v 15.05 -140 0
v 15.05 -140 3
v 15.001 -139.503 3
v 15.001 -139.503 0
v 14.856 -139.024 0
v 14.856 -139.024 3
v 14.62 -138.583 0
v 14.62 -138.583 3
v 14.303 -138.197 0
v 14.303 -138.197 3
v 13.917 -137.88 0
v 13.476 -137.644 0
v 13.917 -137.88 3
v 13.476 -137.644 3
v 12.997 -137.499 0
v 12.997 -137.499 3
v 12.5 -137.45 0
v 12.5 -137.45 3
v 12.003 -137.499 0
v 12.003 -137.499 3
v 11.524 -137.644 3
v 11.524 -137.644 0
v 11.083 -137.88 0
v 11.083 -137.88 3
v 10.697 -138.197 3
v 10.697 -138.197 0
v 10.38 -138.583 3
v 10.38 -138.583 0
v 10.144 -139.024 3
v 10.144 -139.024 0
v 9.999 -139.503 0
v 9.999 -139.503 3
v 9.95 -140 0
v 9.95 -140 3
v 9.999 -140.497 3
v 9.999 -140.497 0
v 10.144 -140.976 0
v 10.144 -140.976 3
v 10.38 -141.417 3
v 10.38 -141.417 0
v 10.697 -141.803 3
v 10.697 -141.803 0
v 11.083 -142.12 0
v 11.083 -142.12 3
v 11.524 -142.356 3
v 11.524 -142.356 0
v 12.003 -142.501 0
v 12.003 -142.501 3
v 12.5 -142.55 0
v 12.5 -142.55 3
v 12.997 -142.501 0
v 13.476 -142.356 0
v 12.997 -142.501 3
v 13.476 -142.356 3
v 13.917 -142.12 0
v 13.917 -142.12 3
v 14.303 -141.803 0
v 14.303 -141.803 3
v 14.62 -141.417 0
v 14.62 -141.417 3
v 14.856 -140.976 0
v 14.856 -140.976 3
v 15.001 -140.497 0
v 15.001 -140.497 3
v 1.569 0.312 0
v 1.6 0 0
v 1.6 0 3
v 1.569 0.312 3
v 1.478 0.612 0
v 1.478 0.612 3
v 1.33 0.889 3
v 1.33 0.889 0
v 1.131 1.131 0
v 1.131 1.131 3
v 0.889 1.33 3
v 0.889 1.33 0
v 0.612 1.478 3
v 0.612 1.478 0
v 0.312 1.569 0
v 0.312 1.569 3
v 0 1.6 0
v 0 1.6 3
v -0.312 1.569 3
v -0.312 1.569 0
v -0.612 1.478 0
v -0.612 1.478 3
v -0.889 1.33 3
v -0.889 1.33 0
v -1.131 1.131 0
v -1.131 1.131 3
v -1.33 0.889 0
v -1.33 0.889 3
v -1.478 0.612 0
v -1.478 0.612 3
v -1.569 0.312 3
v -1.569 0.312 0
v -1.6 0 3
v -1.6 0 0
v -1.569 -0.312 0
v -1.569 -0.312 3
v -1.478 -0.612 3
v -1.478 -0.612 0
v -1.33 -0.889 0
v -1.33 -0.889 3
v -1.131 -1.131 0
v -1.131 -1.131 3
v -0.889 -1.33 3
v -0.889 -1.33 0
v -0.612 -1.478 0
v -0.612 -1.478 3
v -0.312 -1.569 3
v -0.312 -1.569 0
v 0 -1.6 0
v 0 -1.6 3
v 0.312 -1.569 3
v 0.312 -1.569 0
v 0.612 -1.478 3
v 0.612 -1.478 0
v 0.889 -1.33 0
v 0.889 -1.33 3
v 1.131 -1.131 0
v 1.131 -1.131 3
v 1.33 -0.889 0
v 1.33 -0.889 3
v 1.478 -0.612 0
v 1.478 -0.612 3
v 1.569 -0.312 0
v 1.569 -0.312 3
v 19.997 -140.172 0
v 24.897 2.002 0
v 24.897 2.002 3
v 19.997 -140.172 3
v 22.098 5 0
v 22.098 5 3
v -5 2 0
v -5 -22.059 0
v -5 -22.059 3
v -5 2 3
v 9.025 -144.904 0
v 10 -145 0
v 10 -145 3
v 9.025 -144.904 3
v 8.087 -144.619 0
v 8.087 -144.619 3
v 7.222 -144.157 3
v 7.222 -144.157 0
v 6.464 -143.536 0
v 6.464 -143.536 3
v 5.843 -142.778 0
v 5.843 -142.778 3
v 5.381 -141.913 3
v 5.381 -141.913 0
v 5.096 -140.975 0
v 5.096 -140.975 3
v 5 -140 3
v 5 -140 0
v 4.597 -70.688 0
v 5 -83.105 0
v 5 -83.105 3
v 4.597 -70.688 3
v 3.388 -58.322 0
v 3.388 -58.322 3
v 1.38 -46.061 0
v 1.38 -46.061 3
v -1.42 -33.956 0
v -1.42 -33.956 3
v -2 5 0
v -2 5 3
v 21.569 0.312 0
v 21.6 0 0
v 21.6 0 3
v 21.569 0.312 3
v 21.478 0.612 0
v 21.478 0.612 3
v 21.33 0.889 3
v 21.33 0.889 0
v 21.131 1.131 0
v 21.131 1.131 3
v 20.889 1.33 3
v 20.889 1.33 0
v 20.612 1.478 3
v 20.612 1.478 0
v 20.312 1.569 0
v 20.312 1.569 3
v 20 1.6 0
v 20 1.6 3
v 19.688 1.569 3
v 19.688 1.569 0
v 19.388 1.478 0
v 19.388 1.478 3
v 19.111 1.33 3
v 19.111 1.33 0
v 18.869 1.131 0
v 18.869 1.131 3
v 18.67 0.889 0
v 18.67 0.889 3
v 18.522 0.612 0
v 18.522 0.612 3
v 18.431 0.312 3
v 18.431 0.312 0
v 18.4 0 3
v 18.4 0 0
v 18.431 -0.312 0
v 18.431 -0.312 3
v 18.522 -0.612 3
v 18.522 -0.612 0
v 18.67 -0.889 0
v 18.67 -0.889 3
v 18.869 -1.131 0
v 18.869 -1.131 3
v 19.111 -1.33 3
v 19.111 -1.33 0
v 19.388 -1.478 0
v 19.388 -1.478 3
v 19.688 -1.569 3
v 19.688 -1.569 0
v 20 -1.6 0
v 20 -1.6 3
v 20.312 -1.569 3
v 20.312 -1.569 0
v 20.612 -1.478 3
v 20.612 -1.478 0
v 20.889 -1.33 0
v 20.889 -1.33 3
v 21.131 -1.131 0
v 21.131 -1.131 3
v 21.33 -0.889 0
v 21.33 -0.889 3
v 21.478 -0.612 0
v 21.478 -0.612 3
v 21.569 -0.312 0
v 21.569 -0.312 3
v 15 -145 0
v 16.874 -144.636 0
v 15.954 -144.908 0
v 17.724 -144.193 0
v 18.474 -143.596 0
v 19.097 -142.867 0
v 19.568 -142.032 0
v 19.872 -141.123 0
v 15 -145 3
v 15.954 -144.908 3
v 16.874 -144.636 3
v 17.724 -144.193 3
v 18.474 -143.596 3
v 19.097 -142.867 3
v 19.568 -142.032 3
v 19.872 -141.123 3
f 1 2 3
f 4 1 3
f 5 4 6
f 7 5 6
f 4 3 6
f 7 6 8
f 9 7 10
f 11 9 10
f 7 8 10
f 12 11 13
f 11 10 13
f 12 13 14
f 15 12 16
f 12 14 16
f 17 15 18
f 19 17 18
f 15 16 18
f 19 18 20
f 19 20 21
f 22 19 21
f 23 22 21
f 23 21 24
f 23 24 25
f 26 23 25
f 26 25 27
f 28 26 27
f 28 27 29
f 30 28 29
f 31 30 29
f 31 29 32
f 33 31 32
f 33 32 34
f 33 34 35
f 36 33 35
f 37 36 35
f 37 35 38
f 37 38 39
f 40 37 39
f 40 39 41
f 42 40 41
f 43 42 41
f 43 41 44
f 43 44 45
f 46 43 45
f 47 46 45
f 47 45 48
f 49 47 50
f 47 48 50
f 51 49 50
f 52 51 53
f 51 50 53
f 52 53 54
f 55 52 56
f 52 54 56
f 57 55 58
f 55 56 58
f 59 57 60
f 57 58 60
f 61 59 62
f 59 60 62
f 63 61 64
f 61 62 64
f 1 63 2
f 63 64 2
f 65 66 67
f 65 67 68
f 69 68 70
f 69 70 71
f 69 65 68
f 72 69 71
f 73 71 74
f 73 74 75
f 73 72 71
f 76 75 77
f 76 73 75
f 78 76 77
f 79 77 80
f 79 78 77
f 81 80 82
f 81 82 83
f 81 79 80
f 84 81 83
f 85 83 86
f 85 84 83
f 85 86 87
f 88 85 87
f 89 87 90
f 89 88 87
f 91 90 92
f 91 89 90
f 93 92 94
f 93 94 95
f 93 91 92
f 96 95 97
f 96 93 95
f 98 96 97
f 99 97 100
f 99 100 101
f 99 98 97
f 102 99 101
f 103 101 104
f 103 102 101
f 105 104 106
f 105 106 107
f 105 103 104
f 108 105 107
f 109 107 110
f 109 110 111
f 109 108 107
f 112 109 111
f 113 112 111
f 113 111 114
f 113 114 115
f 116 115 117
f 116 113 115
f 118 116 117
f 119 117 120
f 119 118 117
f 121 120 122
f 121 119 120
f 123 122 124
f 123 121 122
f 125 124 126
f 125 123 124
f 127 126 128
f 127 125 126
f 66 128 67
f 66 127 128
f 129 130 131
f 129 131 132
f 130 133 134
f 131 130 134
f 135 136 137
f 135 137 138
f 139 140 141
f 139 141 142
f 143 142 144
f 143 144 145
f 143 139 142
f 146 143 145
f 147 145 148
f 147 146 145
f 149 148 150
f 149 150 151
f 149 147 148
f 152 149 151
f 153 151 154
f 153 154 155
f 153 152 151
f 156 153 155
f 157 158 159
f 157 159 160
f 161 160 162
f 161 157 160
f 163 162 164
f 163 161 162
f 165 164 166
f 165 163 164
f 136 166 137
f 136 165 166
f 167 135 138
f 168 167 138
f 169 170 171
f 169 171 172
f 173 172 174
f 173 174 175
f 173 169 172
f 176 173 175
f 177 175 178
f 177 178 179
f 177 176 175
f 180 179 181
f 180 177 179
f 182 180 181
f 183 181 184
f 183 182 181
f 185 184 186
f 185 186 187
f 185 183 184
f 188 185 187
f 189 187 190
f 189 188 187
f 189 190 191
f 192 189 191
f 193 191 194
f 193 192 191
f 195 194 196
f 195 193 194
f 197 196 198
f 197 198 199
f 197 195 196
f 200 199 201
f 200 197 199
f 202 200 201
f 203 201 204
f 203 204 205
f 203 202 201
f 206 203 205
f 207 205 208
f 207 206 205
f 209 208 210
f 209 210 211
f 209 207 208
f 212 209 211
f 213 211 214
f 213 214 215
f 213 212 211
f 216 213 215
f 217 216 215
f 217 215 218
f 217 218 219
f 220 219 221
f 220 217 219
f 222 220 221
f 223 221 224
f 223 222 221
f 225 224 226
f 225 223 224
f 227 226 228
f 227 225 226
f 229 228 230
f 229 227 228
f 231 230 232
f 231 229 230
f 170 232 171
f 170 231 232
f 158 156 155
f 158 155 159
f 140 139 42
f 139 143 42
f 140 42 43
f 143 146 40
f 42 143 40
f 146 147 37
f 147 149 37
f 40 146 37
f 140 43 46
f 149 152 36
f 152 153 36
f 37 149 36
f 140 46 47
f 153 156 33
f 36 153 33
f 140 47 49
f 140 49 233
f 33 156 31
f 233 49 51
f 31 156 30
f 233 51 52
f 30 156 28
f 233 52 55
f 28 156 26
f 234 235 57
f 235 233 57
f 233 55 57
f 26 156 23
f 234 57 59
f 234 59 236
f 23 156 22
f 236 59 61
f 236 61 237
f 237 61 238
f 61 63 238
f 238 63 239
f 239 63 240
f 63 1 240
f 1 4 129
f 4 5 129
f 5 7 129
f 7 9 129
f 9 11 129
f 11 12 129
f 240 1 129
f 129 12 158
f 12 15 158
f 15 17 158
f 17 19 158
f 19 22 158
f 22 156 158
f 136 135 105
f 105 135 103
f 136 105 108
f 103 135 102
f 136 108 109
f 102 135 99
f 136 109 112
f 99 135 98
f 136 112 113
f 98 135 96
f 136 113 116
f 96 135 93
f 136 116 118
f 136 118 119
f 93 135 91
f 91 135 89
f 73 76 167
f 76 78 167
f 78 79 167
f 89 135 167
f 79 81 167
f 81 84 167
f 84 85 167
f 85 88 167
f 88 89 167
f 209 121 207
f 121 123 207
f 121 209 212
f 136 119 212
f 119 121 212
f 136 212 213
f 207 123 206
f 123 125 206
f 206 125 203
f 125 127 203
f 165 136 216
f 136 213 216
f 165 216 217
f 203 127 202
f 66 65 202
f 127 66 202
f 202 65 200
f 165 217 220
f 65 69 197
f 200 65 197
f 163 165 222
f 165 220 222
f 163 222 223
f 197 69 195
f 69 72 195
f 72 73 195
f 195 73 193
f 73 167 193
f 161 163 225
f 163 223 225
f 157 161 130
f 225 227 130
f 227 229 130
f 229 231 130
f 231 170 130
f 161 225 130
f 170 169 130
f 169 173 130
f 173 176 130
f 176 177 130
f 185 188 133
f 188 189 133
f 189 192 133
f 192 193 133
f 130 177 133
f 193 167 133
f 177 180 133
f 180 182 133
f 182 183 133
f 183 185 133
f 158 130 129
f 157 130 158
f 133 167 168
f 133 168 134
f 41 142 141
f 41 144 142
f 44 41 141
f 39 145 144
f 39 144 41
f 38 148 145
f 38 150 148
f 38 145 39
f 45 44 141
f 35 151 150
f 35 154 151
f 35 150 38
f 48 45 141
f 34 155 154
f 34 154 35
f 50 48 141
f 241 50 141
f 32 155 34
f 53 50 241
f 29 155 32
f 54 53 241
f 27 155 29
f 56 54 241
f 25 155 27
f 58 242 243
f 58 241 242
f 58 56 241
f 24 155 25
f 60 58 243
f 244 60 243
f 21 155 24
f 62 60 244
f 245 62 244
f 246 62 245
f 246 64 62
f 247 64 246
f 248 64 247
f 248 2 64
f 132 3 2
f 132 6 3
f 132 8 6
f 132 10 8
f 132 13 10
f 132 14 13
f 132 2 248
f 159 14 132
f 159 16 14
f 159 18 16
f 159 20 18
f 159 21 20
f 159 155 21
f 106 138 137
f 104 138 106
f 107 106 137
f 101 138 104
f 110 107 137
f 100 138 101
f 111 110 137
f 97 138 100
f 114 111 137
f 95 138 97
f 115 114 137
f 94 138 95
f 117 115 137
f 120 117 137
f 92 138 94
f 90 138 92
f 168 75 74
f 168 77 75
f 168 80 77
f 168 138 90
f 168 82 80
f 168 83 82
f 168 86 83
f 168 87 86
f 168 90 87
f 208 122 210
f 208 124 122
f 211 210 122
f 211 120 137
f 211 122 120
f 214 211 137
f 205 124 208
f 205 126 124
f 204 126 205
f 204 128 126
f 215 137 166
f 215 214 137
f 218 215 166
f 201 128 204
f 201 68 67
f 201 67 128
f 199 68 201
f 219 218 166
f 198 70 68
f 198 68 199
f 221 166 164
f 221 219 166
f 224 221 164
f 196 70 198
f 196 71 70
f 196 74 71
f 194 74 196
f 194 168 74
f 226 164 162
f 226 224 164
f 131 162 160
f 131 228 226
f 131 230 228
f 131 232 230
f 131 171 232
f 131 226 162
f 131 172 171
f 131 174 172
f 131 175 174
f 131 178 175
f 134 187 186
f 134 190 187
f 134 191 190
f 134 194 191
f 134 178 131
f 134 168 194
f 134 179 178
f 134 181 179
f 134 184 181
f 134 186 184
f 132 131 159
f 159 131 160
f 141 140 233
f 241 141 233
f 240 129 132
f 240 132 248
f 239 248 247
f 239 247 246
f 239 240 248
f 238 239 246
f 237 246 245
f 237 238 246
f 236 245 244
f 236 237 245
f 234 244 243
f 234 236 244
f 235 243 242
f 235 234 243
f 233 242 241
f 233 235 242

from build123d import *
from OCP.BRepFilletAPI import BRepFilletAPI_MakeChamfer

# Parameters (mm, degrees)
SKETCH_1_W          = 30
SKETCH_1_H          = 150
SKETCH_1_R          = 1.6
EXTRUDE_1_DEPTH     = 3
CUT_EXTRUDE_3_REACH = 149.17
SKETCH_4_W          = 5
SKETCH_4_H          = 55
CHAMFER_1_SIZE      = 2.5
CUT_EXTRUDE_4_REACH = 149.17
SKETCH_5_R          = 2.55
EXTRUDE_5_DEPTH     = 3
EXTRUDE_2_DEPTH     = 3
FILLET_2_R          = 65
FILLET_3_R          = 115
FILLET_4_R          = 5
CUT_EXTRUDE_START   = -3
CUT_EXTRUDE_6_DEPTH = 3
CHAMFER_2_SIZE      = 3
CHAMFER_2_SIZE2     = 2.901779002


# Read off the part's stored shape, not the designer's step: 切除-拉伸6
with BuildPart() as part:
    # 草图1 → 凸台-拉伸1 (new body)
    with BuildSketch(Plane.XY):
        with Locations((10, -70)):
            Rectangle(SKETCH_1_W, SKETCH_1_H)
        Circle(SKETCH_1_R, mode=Mode.SUBTRACT)
        with Locations((20, 0)):
            Circle(SKETCH_1_R, mode=Mode.SUBTRACT)
    extrude(amount=EXTRUDE_1_DEPTH)

    # 草图4 → 切除-拉伸3 (cut, up to next)
    with BuildSketch(Plane.XY.offset(3), mode=Mode.PRIVATE) as cut_extrude_3_sk1:
        with Locations((-2.5, -117.5)):
            Rectangle(SKETCH_4_W, SKETCH_4_H)
    cut_extrude_3_tool1 = extrude(cut_extrude_3_sk1.sketch, amount=-CUT_EXTRUDE_3_REACH, mode=Mode.PRIVATE) & part.part
    add(cut_extrude_3_tool1.solids().sort_by_distance((-2.5, -117.5, 3))[0], mode=Mode.SUBTRACT)

    # 倒角1
    chamfer_1_edges = [part.edges().sort_by_distance(p)[0] for p in [
        (-5, -90, 1.5),
    ]]
    chamfer(chamfer_1_edges, length=CHAMFER_1_SIZE)

    # 草图5 → 切除-拉伸4 (cut, up to next)
    with BuildSketch(Plane.XY.offset(3), mode=Mode.PRIVATE) as cut_extrude_4_sk1:
        with Locations((12.5, -140)):
            Circle(SKETCH_5_R)
    cut_extrude_4_tool1 = extrude(cut_extrude_4_sk1.sketch, amount=-CUT_EXTRUDE_4_REACH, mode=Mode.PRIVATE) & part.part
    add(cut_extrude_4_tool1.solids().sort_by_distance((12.5, -140, 3))[0], mode=Mode.SUBTRACT)

    # 草图9 → 凸台-拉伸5 (add)
    with BuildSketch(Plane(origin=(0, 0, 0), x_dir=(-1, 0, 0), z_dir=(0, 0, -1))):
        Polygon((5, -87.5), (0, -117.5), (0, -90), (2.5, -90), align=None)
    extrude(amount=-EXTRUDE_5_DEPTH)

    # 草图11 → 拉伸-薄壁2 (add)
    with BuildSketch(Plane.XY.offset(3)):
        Polygon((19.5, -67.916286439), (19.5, -61.710608008), (19.5, -3.420169007), (16.5, -3.420169007), (16.5, -61.710608008), (16.5, -67.916286439), align=None)
    extrude(amount=-EXTRUDE_2_DEPTH)

    # 圆角2
    fillet_2_edges = [part.edges().sort_by_distance(p)[0] for p in [
        (-5, -87.5, 1.5),
    ]]
    fillet(fillet_2_edges, radius=FILLET_2_R)

    # 圆角3
    fillet_3_edges = [part.edges().sort_by_distance(p)[0] for p in [
        (0, -117.5, 1.5),
    ]]
    fillet(fillet_3_edges, radius=FILLET_3_R)

    # 圆角4
    fillet_4_edges = [part.edges().sort_by_distance(p)[0] for p in [
        (0, -145, 1.5),
    ]]
    fillet(fillet_4_edges, radius=FILLET_4_R)

    # 切除-拉伸6 outline → 切除-拉伸6 (cut)
    with BuildSketch(Plane.XY.offset(3).offset(CUT_EXTRUDE_START)):
        with BuildLine():
            ThreePointArc((19.997033519, -140.172209208), (18.47411528, -143.595903644), (15, -145))
            Line((15, -145), (25, -145))
            Line((25, -145), (25, 5))
            Line((25, 5), (19.997033519, -140.172209208))
        make_face()
        with BuildLine():
            ThreePointArc((10, -145), (6.464466094, -143.535533906), (5, -140))
            Line((5, -140), (5, -83.1053734))
            ThreePointArc((5, -83.1053734), (2.483450387, -52.175255091), (-5, -22.058761091))
            Line((-5, -22.058761091), (-5, -82.120435531))
            ThreePointArc((-5, -82.120435531), (-4.778523942, -87.481670081), (-4.115605049, -92.806369705))
            Line((-4.115605049, -92.806369705), (-1.564698759, -108.111807444))
            ThreePointArc((-1.564698759, -108.111807444), (-0.391842257, -117.532429856), (0, -127.017690984))
            Line((0, -127.017690984), (0, -140))
            ThreePointArc((0, -140), (1.464466094, -143.535533906), (5, -145))
            Line((5, -145), (10, -145))
        make_face()
    extrude(amount=CUT_EXTRUDE_6_DEPTH, mode=Mode.SUBTRACT)

    # 倒角2: one chamfer whose edges measure the first distance from different faces: ONE call of the kernel's chamfer builder (chamfer() names one face for all edges)
    chamfer_2_edges_1 = [part.edges().sort_by_distance(p)[0] for p in [
        (-5, 5, 1.5),
    ]]
    chamfer_2_edges_2 = [part.edges().sort_by_distance(p)[0] for p in [
        (25, 5, 1.5),
    ]]
    chamfer_2_side_2 = [part.faces().sort_by_distance(p)[0] for p in [
        (22.498516759, -67.586104604, 1.5),
    ]]
    chamfer_2 = BRepFilletAPI_MakeChamfer(part.part.solid().wrapped)
    for e in chamfer_2_edges_1:
        chamfer_2.Add(CHAMFER_2_SIZE, e.wrapped)
    for e in chamfer_2_edges_2:
        chamfer_2.Add(CHAMFER_2_SIZE, CHAMFER_2_SIZE2, e.wrapped, chamfer_2_side_2[0].wrapped)  # the first distance lies on this face
    add(Compound.cast(chamfer_2.Shape()), mode=Mode.REPLACE)


solid = part.part
